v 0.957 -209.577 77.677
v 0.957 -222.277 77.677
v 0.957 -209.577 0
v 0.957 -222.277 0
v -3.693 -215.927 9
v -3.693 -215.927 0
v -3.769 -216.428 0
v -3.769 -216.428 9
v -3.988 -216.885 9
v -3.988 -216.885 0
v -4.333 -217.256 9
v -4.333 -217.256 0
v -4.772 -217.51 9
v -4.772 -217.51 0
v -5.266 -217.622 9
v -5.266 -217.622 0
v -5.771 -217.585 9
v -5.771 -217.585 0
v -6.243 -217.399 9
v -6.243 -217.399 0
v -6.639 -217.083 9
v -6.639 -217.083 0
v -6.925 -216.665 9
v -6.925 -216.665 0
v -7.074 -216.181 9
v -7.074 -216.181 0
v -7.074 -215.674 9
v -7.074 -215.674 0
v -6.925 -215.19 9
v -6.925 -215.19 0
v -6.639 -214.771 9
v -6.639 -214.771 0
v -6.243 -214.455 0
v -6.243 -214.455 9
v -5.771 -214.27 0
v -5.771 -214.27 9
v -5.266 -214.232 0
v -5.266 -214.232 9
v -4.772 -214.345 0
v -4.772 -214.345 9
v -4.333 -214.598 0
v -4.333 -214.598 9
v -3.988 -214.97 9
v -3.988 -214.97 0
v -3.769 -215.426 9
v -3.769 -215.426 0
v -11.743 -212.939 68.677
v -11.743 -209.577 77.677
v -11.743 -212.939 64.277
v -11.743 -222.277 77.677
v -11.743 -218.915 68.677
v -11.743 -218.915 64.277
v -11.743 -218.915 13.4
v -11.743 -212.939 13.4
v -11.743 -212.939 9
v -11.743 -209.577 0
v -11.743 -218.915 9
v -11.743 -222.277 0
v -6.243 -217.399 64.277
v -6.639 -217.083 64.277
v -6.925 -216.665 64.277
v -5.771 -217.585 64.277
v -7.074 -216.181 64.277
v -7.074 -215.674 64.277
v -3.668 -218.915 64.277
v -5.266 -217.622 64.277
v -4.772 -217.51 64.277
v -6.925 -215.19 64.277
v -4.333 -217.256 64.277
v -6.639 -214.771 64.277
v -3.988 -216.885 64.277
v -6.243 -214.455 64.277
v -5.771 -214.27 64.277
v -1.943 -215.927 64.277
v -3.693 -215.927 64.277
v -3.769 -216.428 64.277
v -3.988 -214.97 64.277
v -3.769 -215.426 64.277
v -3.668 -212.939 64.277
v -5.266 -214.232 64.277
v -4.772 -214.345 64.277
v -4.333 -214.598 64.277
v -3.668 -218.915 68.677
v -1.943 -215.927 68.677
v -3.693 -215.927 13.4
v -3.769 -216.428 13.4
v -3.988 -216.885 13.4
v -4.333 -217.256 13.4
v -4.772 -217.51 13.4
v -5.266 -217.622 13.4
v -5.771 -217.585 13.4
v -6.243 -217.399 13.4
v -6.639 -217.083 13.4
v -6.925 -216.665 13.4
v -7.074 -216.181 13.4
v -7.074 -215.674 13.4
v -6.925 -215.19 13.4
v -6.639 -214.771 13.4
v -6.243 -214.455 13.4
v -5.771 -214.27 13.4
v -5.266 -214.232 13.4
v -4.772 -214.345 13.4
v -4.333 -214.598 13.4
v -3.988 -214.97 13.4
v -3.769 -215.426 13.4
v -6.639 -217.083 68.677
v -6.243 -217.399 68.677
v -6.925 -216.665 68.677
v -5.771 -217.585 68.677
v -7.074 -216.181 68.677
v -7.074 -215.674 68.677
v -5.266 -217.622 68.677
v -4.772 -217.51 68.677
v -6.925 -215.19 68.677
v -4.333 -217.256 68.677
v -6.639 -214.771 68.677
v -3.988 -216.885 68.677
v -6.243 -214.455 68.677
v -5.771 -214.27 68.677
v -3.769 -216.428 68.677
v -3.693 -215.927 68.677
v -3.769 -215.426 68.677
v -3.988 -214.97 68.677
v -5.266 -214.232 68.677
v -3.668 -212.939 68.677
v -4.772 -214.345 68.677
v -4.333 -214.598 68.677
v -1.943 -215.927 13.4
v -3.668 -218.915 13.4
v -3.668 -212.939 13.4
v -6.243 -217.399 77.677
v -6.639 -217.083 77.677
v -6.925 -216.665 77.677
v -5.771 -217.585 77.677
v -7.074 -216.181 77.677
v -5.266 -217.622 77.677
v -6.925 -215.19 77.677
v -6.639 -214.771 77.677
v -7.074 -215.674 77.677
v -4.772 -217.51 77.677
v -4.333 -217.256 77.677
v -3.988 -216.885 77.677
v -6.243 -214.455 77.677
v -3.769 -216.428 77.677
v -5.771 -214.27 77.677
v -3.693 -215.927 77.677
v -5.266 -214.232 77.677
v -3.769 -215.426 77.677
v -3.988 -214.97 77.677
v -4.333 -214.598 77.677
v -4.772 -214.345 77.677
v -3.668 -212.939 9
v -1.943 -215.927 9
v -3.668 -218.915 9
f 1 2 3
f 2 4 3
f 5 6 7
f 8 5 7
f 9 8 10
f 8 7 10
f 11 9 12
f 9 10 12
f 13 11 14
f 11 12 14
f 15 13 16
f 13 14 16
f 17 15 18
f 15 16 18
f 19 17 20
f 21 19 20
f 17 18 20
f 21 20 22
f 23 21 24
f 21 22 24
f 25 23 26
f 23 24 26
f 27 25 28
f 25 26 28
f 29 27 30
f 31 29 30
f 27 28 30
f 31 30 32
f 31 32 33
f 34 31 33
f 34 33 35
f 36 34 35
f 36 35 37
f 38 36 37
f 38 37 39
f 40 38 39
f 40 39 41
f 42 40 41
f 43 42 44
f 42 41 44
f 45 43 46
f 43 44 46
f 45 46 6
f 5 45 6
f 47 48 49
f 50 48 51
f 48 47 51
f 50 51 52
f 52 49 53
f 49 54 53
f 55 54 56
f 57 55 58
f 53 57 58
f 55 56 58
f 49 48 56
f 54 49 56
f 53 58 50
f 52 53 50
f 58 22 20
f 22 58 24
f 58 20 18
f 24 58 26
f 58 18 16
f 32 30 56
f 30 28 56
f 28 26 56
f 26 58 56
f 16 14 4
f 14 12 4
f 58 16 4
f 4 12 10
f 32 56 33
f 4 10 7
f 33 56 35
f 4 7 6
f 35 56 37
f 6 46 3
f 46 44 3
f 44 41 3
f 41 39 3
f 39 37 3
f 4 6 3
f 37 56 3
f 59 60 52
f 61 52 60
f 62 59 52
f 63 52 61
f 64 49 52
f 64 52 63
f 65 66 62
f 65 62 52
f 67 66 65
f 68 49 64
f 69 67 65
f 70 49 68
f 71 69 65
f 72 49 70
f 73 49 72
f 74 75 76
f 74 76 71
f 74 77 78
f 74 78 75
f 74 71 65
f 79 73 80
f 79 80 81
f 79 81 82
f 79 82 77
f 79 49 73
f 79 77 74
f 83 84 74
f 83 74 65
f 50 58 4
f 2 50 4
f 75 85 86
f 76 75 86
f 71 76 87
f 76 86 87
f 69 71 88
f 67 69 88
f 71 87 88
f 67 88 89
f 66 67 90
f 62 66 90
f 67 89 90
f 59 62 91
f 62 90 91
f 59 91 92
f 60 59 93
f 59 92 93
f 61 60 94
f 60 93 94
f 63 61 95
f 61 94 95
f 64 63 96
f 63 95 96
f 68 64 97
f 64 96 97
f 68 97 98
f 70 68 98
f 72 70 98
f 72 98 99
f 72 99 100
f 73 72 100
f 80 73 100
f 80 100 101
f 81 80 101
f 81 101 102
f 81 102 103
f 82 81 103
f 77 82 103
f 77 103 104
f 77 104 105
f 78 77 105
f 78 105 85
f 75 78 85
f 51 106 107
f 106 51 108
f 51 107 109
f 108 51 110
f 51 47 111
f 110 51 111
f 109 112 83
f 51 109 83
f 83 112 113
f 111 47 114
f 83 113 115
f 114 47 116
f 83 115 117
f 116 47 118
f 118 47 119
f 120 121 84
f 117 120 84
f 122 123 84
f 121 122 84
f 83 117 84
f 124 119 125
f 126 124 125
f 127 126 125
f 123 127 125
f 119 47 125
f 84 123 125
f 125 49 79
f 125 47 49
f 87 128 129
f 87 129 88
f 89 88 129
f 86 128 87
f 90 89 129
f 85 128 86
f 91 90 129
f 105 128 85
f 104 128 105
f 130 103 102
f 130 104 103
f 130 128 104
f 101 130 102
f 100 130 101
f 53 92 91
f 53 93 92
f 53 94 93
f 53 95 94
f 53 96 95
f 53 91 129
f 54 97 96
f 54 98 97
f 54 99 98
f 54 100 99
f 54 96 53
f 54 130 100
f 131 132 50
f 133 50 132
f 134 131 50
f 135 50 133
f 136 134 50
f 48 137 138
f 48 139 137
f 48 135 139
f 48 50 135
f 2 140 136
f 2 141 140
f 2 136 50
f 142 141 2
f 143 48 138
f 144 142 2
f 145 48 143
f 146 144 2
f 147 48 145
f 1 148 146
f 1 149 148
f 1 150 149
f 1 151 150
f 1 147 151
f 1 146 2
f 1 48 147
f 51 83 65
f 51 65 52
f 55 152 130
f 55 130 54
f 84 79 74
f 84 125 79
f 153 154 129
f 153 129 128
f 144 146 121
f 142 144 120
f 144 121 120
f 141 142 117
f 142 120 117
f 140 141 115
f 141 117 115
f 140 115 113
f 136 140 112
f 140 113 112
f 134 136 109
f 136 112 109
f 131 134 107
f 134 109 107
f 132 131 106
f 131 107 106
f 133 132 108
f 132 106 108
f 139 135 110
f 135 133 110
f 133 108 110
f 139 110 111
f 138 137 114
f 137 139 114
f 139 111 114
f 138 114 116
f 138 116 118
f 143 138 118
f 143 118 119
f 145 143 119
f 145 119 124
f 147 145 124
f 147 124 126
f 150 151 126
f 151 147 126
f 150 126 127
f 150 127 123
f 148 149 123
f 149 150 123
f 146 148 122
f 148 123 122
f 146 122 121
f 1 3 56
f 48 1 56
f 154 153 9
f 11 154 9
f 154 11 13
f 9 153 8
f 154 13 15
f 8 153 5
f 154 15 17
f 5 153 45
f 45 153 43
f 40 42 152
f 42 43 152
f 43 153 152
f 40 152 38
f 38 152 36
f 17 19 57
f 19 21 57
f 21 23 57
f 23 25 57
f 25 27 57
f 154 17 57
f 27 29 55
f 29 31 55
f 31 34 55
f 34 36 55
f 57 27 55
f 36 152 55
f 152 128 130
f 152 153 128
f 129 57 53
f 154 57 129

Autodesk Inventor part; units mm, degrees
ref_plane "YZ Plane" through (0, 0, 0) normal (1, 0, 0) x (0, 1, 0)
ref_plane "Work Plane1" through (0, 0, 0) normal (0, 0, 1) x (1, 0, 0)
sketch "Sketch1" plane through (0, 0, 0) normal (0, 0, 1) x (1, 0, 0)
  circle A0 centre (-5.3931, -215.9272) radius 1.778 construction
  line L0 (0.9569, -209.5772) -> (-11.7431, -209.5772)
  line L1 (-11.7431, -209.5772) -> (-11.7431, -222.2772)
  line L2 (-11.7431, -222.2772) -> (0.9569, -222.2772)
  line L3 (0.9569, -222.2772) -> (0.9569, -209.5772)
  line L4 (0.9569, -209.5772) -> (-11.7431, -222.2772) construction
  line L5 (-11.7431, -209.5772) -> (0.9569, -222.2772) construction
  circle A1 centre (-5.3931, -215.9272) radius 1.7
  point P0 (0, 0)
  dimension "d0" = 12.7
  dimension "d1" = 12.7
  dimension "d2" = 3.4
ref_plane "Work Plane2" through (-150.1545, -254.8124, 77.677) normal (0, 0, -1) x (0, 1, 0)
extrude "Extrusion1" add sketch "Sketch1" along normal up to surface (77.677 mm away)
ref_plane "Work Plane3" through (0, 0, 9) normal (0, 0, -1) x (-1, 0, 0)
sketch "Sketch2" plane through (0, 0, 9) normal (0, 0, -1) x (-1, 0, 0)
  circle A0 centre (5.3931, -215.9272) radius 1.7 construction
  circle A1 centre (5.3931, -215.9272) radius 3.45 construction
  line L0 (11.7431, -218.915) -> (3.6681, -218.915)
  line L1 (3.6681, -218.915) -> (1.9431, -215.9272)
  line L2 (1.9431, -215.9272) -> (3.6681, -212.9394)
  line L3 (3.6681, -212.9394) -> (11.7431, -212.9394)
  line L4 (11.7431, -212.9394) -> (11.7431, -218.915)
  line L5 (11.7431, -209.5772) -> (11.7431, -222.2772) projected
  line L6 (11.7431, -218.915) -> (3.6681, -218.915)
  line L7 (3.6681, -218.915) -> (1.9431, -215.9272)
  line L8 (1.9431, -215.9272) -> (3.6681, -212.9394)
  line L9 (3.6681, -212.9394) -> (11.7431, -212.9394)
  line L10 (11.7431, -212.9394) -> (11.7431, -218.915)
  point P0 (0, 0)
  dimension "d6" = 6.9
extrude "Extrusion2" cut sketch "Sketch2" against normal blind 4.4
ref_plane "Work Plane4" through (-11.7431, -222.2772, 68.677) normal (0, 0, 1) x (1, 0, 0)
sketch "Sketch3" plane through (-11.7431, -222.2772, 68.677) normal (0, 0, 1) x (1, 0, 0)
  line L0 (0, 9.3378) -> (8.075, 9.3378)
  line L1 (8.075, 9.3378) -> (9.8, 6.35)
  line L2 (9.8, 6.35) -> (8.075, 3.3622)
  line L3 (8.075, 3.3622) -> (0, 3.3622)
  line L4 (0, 3.3622) -> (0, 9.3378)
  circle A0 centre (6.35, 6.35) radius 1.7 construction
  circle A1 centre (6.35, 6.35) radius 3.45 construction
  point P0 (11.7431, 222.2772)
  dimension "d10" = 6.9
extrude "Extrusion3" cut sketch "Sketch3" against normal blind 4.4
properties part number "supports"
